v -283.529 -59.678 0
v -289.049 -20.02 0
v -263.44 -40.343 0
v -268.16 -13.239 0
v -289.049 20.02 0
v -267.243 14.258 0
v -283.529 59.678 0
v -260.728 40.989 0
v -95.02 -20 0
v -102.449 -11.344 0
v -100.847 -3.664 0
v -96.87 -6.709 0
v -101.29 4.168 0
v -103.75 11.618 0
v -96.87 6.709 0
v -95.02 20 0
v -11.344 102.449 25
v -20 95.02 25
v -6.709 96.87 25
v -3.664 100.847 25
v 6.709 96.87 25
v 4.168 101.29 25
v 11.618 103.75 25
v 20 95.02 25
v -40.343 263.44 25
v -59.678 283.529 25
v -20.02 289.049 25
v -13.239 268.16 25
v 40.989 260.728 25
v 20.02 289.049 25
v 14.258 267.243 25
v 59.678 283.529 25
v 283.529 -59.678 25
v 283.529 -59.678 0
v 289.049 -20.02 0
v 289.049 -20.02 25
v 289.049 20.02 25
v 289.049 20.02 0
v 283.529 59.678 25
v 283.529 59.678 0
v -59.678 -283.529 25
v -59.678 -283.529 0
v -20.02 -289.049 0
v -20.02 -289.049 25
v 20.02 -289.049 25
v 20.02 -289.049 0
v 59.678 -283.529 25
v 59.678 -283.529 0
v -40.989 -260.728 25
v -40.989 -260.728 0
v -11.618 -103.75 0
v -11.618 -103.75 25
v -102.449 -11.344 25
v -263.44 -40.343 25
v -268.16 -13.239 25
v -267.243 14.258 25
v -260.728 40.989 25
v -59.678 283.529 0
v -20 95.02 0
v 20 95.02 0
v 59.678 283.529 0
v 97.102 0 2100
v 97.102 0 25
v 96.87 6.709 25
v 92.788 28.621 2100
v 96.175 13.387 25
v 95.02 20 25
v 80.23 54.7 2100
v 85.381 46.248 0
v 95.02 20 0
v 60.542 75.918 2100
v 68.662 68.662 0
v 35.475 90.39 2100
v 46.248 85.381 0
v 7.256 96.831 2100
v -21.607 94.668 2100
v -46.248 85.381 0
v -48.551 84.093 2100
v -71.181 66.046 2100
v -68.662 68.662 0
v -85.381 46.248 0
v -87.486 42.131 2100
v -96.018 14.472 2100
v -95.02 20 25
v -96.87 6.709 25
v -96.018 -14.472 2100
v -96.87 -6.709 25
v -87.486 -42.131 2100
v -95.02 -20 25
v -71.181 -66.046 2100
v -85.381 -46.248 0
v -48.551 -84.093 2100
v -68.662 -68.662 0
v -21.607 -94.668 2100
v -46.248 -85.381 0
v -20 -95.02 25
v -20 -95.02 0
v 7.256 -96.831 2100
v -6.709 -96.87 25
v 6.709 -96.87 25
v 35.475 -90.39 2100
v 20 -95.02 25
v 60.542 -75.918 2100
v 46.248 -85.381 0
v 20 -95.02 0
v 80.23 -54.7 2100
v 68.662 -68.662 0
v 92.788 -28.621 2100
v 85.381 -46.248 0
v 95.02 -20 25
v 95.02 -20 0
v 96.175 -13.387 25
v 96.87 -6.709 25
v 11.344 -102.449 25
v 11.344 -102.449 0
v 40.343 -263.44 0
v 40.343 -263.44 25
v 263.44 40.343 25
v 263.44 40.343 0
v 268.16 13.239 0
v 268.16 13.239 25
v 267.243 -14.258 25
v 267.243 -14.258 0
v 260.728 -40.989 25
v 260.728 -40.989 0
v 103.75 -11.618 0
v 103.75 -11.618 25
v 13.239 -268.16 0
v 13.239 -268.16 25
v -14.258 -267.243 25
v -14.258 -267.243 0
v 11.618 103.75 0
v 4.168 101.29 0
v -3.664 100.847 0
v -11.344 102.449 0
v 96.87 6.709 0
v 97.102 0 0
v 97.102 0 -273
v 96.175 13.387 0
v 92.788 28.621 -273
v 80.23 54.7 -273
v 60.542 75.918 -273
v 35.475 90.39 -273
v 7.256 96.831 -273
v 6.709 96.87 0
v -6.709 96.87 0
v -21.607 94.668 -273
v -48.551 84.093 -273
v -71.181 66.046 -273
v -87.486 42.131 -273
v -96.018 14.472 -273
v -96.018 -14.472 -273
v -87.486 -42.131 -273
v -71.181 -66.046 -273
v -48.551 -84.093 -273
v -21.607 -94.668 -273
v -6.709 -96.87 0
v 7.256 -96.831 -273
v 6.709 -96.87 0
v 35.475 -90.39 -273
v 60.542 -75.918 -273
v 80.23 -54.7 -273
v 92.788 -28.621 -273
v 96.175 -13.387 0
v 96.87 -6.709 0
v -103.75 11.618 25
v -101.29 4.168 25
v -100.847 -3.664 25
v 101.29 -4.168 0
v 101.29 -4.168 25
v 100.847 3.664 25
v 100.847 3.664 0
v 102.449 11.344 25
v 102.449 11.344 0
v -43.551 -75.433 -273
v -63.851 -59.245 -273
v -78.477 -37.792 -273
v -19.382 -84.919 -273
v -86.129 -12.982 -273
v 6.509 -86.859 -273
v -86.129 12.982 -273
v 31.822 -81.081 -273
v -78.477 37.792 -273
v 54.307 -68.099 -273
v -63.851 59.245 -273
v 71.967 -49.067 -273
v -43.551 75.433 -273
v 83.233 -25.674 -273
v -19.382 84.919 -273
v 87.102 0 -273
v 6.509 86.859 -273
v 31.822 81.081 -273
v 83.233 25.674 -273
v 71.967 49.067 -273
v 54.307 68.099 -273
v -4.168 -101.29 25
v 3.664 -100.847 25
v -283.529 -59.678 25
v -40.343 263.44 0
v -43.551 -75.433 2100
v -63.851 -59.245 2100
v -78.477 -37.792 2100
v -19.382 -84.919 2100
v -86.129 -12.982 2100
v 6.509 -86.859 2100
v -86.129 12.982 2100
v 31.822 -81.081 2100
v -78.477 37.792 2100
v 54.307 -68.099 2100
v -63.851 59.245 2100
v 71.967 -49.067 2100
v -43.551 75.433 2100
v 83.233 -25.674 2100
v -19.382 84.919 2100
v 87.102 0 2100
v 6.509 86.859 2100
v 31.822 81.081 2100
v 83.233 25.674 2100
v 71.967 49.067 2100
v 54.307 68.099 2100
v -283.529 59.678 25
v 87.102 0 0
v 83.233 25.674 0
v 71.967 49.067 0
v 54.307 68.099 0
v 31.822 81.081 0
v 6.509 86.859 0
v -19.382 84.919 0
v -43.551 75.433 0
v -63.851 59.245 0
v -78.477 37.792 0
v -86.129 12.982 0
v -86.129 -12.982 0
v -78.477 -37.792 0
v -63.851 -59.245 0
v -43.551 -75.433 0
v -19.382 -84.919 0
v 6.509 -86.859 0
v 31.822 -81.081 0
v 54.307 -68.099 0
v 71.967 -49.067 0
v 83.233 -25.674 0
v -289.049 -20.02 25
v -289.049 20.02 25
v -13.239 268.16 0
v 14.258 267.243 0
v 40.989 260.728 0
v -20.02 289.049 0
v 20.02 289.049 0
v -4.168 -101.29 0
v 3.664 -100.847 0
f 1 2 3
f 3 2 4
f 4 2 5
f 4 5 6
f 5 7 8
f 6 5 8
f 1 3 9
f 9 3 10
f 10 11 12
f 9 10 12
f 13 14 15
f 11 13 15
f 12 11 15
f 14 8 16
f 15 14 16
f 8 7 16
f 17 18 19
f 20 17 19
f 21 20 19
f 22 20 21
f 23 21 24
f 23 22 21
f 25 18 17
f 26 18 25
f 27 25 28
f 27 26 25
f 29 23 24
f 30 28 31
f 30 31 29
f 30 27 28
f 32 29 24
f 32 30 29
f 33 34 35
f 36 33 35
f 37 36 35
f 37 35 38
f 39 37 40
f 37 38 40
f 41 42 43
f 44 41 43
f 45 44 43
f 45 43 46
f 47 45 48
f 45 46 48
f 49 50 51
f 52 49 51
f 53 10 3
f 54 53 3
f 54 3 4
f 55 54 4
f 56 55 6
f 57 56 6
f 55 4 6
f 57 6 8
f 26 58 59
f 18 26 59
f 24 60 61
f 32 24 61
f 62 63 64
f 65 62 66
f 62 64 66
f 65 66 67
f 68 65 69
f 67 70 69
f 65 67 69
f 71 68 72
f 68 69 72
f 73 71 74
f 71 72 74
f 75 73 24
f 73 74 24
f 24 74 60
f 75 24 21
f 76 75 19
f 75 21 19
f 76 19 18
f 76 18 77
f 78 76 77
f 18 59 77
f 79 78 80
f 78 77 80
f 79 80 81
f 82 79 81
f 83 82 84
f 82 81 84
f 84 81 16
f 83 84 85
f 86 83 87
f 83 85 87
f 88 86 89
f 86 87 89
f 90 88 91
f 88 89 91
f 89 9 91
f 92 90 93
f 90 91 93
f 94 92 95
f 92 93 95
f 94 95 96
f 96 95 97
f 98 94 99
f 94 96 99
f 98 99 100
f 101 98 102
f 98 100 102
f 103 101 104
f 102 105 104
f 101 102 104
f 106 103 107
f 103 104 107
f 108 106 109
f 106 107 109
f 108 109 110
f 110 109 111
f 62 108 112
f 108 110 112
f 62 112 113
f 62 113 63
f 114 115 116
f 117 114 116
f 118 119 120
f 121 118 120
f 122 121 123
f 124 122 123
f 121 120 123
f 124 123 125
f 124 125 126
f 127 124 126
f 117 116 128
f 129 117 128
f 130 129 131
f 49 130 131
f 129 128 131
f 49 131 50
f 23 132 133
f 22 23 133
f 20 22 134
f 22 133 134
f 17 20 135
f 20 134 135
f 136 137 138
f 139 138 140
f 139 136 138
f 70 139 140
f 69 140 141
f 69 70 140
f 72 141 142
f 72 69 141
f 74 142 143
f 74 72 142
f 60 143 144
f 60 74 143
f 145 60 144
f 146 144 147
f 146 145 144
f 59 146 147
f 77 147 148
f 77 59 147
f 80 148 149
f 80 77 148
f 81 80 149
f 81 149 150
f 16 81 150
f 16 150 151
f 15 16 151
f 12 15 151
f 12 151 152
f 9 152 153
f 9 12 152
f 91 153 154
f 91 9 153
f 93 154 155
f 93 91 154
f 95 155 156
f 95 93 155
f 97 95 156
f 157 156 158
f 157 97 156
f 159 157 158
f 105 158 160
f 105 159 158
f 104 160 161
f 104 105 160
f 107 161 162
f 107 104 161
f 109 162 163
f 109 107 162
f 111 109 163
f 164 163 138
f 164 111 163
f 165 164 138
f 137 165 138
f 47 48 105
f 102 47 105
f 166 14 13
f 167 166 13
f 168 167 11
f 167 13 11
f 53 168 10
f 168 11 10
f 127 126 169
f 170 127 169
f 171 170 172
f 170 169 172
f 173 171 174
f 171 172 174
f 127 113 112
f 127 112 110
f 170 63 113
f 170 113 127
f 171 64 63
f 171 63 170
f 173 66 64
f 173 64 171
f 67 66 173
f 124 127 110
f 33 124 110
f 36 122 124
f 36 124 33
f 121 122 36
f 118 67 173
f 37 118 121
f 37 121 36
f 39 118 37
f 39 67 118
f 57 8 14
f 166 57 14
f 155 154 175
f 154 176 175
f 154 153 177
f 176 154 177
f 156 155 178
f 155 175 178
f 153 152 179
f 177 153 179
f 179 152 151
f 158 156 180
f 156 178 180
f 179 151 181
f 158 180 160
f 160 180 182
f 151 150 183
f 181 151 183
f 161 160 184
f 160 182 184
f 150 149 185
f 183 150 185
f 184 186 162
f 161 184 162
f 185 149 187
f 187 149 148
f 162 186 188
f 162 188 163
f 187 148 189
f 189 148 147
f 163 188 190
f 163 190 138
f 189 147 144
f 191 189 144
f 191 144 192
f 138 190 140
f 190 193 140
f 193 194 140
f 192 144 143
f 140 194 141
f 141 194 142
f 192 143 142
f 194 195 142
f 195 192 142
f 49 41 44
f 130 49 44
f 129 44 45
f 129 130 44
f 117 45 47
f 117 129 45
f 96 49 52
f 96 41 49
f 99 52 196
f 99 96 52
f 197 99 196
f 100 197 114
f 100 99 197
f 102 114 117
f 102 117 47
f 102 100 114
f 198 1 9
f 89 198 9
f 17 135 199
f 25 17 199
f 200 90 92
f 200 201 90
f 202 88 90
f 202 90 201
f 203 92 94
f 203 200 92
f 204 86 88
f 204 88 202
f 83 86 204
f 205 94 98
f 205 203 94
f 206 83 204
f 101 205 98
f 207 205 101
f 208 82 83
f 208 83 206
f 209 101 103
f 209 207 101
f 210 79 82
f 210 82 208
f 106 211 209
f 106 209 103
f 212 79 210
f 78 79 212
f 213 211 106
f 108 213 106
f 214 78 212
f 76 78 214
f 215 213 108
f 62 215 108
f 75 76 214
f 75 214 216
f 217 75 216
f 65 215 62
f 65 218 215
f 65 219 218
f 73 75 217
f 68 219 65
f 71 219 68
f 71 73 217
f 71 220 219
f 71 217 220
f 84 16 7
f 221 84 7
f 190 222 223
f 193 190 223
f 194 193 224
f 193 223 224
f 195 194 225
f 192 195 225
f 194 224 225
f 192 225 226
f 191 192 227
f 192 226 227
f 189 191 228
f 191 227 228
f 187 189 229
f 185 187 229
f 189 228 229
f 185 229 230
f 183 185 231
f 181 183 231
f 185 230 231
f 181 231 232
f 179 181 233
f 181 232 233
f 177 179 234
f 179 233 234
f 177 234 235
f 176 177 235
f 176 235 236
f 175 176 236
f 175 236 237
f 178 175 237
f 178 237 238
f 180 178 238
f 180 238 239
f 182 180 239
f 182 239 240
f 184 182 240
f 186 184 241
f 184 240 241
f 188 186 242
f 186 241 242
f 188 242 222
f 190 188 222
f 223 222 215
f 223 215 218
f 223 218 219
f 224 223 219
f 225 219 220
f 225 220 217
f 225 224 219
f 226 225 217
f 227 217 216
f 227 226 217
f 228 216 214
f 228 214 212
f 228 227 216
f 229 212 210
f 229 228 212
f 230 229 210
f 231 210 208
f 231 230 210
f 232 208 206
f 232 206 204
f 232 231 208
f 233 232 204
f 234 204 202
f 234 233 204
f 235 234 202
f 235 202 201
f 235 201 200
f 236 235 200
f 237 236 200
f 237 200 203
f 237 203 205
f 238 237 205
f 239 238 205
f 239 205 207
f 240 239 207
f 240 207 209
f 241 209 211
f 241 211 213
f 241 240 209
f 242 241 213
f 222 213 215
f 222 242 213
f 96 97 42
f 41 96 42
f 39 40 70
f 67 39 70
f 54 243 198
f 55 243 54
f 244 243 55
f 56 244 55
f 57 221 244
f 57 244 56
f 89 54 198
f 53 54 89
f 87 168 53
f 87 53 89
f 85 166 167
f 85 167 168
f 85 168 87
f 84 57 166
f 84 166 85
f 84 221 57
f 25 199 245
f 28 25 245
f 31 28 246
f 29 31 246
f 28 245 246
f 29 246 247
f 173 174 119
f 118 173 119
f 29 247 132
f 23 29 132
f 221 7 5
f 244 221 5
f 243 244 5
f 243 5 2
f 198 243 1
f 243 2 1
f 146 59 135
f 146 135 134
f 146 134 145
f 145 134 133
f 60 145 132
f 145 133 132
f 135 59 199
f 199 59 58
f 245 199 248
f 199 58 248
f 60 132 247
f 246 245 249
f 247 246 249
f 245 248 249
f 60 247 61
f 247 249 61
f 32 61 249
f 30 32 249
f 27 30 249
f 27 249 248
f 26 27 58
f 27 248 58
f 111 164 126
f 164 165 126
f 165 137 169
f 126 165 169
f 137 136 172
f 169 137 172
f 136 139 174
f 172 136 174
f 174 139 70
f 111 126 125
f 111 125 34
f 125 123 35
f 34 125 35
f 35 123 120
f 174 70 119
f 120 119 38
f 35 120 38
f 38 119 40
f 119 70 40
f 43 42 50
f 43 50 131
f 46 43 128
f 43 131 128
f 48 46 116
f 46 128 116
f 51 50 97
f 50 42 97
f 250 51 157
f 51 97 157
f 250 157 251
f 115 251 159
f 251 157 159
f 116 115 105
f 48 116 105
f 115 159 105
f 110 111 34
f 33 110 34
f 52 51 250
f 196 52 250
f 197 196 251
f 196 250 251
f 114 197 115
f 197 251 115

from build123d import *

# Parameters (mm, degrees)
BOSS_EXTRUDE5_DEPTH      = 25
BOSS_EXTRUDE5_2_DEPTH    = 25
BOSS_EXTRUDE5_3_DEPTH    = 25
BOSS_EXTRUDE5_4_DEPTH    = 25
SKETCH5_R                = 97.102354857
SKETCH5_R_2              = 87.102354857
BOSS_EXTRUDE6_DEPTH      = 2100
BOSS_EXTRUDE6_DEPTH_BACK = 273


with BuildPart() as part:
    # Sketch4 → Boss-Extrude5 (new body)
    with BuildSketch(Plane.XY):
        with BuildLine():
            Line((-283.528917558, -59.677513544), (-95.020352129, -20))
            ThreePointArc((-95.020352129, -20), (-97.102354857, 0), (-95.020352129, 20))
            Line((-95.020352129, 20), (-283.528917558, 59.677513544))
            ThreePointArc((-283.528917558, 59.677513544), (-289.741354857, 0), (-283.528917558, -59.677513544))
        make_face()
        with BuildLine():
            ThreePointArc((-103.749908429, 11.618296452), (-100.811412037, 0.266569794), (-102.448791191, -11.344435703))
            Line((-102.448791191, -11.344435703), (-263.440278466, -40.343403868))
            ThreePointArc((-263.440278466, -40.343403868), (-268.408850648, 0.533483895), (-260.728236447, 40.988580338))
            Line((-260.728236447, 40.988580338), (-103.749908429, 11.618296452))
        make_face(mode=Mode.SUBTRACT)
    extrude(amount=BOSS_EXTRUDE5_DEPTH)



with BuildPart() as body_2:
    # Sketch4 → Boss-Extrude5 2 (new body)
    with BuildSketch(Plane.XY):
        with BuildLine():
            Line((-59.677513544, 283.528917558), (-20, 95.020352129))
            ThreePointArc((-20, 95.020352129), (0, 97.102354857), (20, 95.020352129))
            Line((20, 95.020352129), (59.677513544, 283.528917558))
            ThreePointArc((59.677513544, 283.528917558), (0, 289.741354857), (-59.677513544, 283.528917558))
        make_face()
        with BuildLine():
            Line((40.988580338, 260.728236447), (11.618296452, 103.749908429))
            ThreePointArc((11.618296452, 103.749908429), (0.266569794, 100.811412037), (-11.344435703, 102.448791191))
            Line((-11.344435703, 102.448791191), (-40.343403868, 263.440278466))
            ThreePointArc((-40.343403868, 263.440278466), (0.533483895, 268.408850648), (40.988580338, 260.728236447))
        make_face(mode=Mode.SUBTRACT)
    extrude(amount=BOSS_EXTRUDE5_2_DEPTH)


with BuildPart() as body_3:
    # Sketch4 → Boss-Extrude5 3 (new body)
    with BuildSketch(Plane.XY):
        with BuildLine():
            ThreePointArc((97.102354857, 0), (96.580451619, -10.054038186), (95.020352129, -20))
            Line((95.020352129, -20), (283.528917558, -59.677513544))
            ThreePointArc((283.528917558, -59.677513544), (289.741354857, 0), (283.528917558, 59.677513544))
            Line((283.528917558, 59.677513544), (95.020352129, 20))
            ThreePointArc((95.020352129, 20), (96.580451619, 10.054038186), (97.102354857, 0))
        make_face()
        with BuildLine():
            Line((260.728236447, -40.988580338), (103.749908429, -11.618296452))
            ThreePointArc((103.749908429, -11.618296452), (100.811412037, -0.266569794), (102.448791191, 11.344435703))
            Line((102.448791191, 11.344435703), (263.440278466, 40.343403868))
            ThreePointArc((263.440278466, 40.343403868), (268.408850648, -0.533483895), (260.728236447, -40.988580338))
        make_face(mode=Mode.SUBTRACT)
    extrude(amount=BOSS_EXTRUDE5_3_DEPTH)


with BuildPart() as body_4:
    # Sketch4 → Boss-Extrude5 4 (new body)
    with BuildSketch(Plane.XY):
        with BuildLine():
            ThreePointArc((20, -95.020352129), (0, -97.102354857), (-20, -95.020352129))
            Line((-20, -95.020352129), (-59.677513544, -283.528917558))
            ThreePointArc((-59.677513544, -283.528917558), (0, -289.741354857), (59.677513544, -283.528917558))
            Line((59.677513544, -283.528917558), (20, -95.020352129))
        make_face()
        with BuildLine():
            Line((-40.988580338, -260.728236447), (-11.618296452, -103.749908429))
            ThreePointArc((-11.618296452, -103.749908429), (-0.266569794, -100.811412037), (11.344435703, -102.448791191))
            Line((11.344435703, -102.448791191), (40.343403868, -263.440278466))
            ThreePointArc((40.343403868, -263.440278466), (-0.533483895, -268.408850648), (-40.988580338, -260.728236447))
        make_face(mode=Mode.SUBTRACT)
    extrude(amount=BOSS_EXTRUDE5_4_DEPTH)


with BuildPart() as part_1:
    add(part.part)

    add(body_2.part)  # Boss-Extrude6 merges body 2

    add(body_3.part)  # Boss-Extrude6 merges body 3

    add(body_4.part)  # Boss-Extrude6 merges body 4
    # Sketch5 → Boss-Extrude6 (add, two sides)
    with BuildSketch(Plane.XY) as boss_extrude6_sk:
        Circle(SKETCH5_R)
        Circle(SKETCH5_R_2, mode=Mode.SUBTRACT)
    extrude(amount=BOSS_EXTRUDE6_DEPTH)
    extrude(boss_extrude6_sk.sketch, amount=-BOSS_EXTRUDE6_DEPTH_BACK)


solid = part_1.part
